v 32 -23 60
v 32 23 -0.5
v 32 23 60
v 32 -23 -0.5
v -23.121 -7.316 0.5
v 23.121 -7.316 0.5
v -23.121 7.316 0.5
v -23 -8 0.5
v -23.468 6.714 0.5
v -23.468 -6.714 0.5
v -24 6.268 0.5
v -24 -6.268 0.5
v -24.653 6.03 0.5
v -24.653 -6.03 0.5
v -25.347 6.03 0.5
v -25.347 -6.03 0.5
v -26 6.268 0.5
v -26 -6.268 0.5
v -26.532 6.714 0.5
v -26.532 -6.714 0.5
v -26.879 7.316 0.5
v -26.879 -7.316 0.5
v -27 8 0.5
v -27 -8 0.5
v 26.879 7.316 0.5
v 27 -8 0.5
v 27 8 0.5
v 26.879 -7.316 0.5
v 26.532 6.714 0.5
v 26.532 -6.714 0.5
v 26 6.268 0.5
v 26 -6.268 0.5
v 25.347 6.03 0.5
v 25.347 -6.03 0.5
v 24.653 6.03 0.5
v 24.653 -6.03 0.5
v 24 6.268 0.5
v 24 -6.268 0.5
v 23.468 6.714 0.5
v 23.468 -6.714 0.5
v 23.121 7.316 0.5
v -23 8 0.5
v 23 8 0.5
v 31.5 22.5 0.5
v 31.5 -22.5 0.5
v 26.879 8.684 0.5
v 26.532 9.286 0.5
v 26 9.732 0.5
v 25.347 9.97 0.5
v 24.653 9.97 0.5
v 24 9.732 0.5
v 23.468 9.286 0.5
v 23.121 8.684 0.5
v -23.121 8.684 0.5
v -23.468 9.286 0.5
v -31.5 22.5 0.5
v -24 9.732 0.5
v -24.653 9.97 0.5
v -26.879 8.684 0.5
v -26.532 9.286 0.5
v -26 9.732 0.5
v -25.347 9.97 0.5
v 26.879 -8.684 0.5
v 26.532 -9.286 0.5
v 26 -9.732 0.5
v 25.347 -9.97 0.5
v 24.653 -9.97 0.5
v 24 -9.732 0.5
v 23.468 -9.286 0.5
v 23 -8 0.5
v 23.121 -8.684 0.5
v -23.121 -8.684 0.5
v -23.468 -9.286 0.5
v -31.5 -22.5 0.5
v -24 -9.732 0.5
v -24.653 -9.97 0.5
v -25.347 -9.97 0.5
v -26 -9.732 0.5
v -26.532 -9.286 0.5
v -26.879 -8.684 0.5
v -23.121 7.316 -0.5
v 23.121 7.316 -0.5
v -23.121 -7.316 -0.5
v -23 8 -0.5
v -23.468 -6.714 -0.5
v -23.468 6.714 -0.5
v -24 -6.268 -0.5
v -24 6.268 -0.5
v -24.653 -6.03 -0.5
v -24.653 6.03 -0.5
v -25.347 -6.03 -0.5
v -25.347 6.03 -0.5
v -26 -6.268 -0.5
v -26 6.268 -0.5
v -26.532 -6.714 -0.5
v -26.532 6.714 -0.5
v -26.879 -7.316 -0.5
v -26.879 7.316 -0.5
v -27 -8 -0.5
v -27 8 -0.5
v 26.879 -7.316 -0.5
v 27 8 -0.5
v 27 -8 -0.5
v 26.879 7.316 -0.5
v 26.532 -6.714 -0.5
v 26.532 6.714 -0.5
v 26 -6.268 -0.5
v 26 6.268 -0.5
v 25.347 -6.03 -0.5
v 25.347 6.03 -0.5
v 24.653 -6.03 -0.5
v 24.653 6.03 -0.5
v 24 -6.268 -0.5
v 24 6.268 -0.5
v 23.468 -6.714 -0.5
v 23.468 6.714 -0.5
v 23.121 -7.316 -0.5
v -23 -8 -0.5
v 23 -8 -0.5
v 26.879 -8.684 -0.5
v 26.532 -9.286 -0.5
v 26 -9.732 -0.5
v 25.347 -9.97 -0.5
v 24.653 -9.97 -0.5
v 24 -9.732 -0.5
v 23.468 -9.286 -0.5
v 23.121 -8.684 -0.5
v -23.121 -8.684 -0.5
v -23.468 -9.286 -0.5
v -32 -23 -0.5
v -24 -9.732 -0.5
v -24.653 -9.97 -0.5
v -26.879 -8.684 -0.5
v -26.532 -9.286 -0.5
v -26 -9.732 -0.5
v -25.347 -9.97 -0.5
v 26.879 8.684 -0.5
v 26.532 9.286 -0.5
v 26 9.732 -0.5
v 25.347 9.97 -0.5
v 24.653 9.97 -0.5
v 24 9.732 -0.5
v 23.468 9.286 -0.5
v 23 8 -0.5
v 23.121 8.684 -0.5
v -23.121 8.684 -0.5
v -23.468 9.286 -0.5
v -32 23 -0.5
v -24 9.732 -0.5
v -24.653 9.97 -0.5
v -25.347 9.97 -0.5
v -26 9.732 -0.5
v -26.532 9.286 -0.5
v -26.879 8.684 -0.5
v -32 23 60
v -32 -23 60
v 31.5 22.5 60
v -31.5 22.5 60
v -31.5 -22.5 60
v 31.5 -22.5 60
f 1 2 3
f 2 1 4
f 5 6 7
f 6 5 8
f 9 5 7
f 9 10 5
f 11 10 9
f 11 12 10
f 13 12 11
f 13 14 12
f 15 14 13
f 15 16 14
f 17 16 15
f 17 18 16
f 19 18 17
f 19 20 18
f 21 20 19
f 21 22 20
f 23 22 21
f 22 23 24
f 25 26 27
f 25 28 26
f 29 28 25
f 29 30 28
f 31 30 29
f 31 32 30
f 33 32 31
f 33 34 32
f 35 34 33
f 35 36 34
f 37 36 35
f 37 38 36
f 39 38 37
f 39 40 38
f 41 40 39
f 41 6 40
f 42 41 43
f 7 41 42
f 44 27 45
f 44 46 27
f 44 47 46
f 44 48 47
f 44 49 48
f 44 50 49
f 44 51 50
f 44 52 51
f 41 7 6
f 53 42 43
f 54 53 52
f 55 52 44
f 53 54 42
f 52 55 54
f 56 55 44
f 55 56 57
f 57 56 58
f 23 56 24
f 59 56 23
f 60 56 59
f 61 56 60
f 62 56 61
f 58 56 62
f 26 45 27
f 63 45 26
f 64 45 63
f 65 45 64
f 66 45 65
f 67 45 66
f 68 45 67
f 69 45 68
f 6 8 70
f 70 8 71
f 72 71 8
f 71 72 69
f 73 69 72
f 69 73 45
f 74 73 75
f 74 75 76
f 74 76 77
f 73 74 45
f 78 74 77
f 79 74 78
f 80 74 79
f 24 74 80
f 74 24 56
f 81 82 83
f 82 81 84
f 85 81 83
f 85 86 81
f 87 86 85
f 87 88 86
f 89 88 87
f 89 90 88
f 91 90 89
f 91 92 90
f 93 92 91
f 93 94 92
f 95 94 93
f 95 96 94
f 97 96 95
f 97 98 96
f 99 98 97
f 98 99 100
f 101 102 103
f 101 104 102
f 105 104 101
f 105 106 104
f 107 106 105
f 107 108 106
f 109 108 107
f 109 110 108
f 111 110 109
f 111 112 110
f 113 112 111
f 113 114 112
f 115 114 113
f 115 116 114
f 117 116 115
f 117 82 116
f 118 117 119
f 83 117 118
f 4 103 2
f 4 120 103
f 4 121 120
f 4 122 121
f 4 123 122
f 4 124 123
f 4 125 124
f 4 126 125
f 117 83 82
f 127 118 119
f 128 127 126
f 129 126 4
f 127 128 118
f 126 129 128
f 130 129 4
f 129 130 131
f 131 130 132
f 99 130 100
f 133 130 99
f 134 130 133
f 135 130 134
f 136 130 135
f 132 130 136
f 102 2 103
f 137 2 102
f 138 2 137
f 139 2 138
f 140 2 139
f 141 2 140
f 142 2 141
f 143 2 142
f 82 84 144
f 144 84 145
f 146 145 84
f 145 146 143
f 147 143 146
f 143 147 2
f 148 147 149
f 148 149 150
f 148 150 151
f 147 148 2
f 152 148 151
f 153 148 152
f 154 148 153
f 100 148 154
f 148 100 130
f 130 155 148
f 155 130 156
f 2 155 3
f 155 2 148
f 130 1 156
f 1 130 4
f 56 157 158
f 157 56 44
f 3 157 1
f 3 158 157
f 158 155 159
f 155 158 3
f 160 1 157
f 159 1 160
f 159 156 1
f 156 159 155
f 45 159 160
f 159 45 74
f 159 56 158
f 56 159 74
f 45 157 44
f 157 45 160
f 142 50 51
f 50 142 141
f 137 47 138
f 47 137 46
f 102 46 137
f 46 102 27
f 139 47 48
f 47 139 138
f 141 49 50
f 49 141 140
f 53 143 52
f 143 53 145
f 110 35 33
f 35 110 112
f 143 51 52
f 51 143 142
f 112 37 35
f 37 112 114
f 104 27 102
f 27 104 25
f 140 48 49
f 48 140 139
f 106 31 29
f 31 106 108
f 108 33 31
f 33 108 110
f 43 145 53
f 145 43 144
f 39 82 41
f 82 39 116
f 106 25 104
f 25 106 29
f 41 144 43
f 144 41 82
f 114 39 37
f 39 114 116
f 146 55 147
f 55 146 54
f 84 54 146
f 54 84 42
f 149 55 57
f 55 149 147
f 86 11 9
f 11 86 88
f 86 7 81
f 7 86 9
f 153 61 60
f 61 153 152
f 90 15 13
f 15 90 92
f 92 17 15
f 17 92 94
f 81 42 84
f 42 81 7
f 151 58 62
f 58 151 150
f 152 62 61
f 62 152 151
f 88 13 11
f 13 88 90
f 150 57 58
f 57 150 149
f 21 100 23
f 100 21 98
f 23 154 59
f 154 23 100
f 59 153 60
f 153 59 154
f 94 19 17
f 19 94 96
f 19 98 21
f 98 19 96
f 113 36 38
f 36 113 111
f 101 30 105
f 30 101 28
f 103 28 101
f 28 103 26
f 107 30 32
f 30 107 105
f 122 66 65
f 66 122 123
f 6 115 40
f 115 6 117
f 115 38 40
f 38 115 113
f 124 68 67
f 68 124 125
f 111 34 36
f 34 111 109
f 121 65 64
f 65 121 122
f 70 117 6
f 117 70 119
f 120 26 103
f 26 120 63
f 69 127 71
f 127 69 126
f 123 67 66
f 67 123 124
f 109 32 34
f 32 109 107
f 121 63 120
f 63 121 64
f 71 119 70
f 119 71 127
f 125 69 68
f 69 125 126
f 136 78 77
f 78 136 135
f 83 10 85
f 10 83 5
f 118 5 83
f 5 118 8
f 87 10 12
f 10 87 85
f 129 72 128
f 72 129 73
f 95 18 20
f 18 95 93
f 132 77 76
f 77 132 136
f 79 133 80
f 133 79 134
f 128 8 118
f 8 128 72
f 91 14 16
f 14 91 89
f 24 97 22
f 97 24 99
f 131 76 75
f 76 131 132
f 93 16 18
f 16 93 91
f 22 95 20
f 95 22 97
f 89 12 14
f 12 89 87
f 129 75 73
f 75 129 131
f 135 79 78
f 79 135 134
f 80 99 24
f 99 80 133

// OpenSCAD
$fn = 18;

// lenght & width are inside sizes
module base(length, width, height)
{
	wall=0.5;
	holesize=2;
	step = width/(holesize*holesize*2);	
	// echo(step);
	difference() {
		union() {
			// bottom
			echo("lenght:", length);
			echo("width:", width);			
			cube([length+2*wall,width+2*wall,1],center = true);
			// sides - long
			color("gray") translate([0,width/2+wall-(wall/2), height/2]) rotate([90,0 ,0 ]) cube([length+wall*2,height, wall], center=true);
			color("gray") translate([0,-width/2-wall+(wall/2) , height/2]) rotate([90,0 ,0 ]) cube([length+wall*2,height, wall], center=true);
			// sides - short
			translate([-length/2-wall+(wall/2),0 , height/2]) rotate([0,0 ,90 ])  rotate([90,0 ,0 ]) cube([width+wall,height, wall], center=true);
			translate([length/2+wall-(wall/2),0 , height/2]) rotate([0,0 ,90 ])  rotate([90,0 ,0 ])  cube([width+wall,height, wall], center=true);
			// corners - vertical
			// color("blue") translate([length/2+wall-0.5,width/2+wall-0.5 , 0]) cylinder(r=0.5, h=height, center=false);
			// color("blue") translate([-length/2-wall+0.5,width/2+wall-0.5 , 0]) cylinder(r=0.5, h=height, center=false);
			// color("blue") translate([length/2+wall-0.5,-width/2-wall+0.5 , 0]) cylinder(r=0.5, h=height, center=false);
			// color("blue") translate([-length/2-wall+0.5,-width/2-wall+0.5 , 0]) cylinder(r=0.5, h=height, center=false);

		}
		//mounting holes
		color("red") translate([25,8, 0]) cylinder(h=3, r=2, center=true);
		color("red") translate([-25,8, 0]) cylinder(h=3, r=2, center=true);
		color("red") translate([25,-8, 0]) cylinder(h=3, r=2, center=true);
		color("red") translate([-25,-8, 0]) cylinder(h=3, r=2, center=true);

		// drain holes
		/*
		for (i = [-width/2+step:step:width/2-step]) {
			color("red") translate([length/2,i,2.5]) rotate([0,90,0]) cylinder(h=3*wall, r=holesize, center=true);
			color("red") translate([-length/2,i,2.5]) rotate([0,90,0]) cylinder(h=3*wall, r=holesize, center=true);
		}
		for (i = [-length/2+2*wall:8*wall:length/2-2*wall]) {
			color("red") translate([i,width/2,3]) rotate([90,0,0]) cylinder(h=3*wall, r=1, center=true);
			color("red") translate([i,-width/2,3]) rotate([90,0,0]) cylinder(h=3*wall, r=1, center=true);
		}
		// cable holes
		color("red") translate([0,-width/2,10])  rotate([90,0,0]) cylinder(h=4*wall, r=3, center=true);
		color("red") translate([0,width/2,10])  rotate([90,0,0]) cylinder(h=4*wall, r=3, center=true);
		*/

		// mounting holes
		// color("red") translate([length/2-10,-width/2,height-5])  rotate([90,0,0]) cylinder(h=4*wall, r=2, center=true);
	}
}

base(63,45,60);
